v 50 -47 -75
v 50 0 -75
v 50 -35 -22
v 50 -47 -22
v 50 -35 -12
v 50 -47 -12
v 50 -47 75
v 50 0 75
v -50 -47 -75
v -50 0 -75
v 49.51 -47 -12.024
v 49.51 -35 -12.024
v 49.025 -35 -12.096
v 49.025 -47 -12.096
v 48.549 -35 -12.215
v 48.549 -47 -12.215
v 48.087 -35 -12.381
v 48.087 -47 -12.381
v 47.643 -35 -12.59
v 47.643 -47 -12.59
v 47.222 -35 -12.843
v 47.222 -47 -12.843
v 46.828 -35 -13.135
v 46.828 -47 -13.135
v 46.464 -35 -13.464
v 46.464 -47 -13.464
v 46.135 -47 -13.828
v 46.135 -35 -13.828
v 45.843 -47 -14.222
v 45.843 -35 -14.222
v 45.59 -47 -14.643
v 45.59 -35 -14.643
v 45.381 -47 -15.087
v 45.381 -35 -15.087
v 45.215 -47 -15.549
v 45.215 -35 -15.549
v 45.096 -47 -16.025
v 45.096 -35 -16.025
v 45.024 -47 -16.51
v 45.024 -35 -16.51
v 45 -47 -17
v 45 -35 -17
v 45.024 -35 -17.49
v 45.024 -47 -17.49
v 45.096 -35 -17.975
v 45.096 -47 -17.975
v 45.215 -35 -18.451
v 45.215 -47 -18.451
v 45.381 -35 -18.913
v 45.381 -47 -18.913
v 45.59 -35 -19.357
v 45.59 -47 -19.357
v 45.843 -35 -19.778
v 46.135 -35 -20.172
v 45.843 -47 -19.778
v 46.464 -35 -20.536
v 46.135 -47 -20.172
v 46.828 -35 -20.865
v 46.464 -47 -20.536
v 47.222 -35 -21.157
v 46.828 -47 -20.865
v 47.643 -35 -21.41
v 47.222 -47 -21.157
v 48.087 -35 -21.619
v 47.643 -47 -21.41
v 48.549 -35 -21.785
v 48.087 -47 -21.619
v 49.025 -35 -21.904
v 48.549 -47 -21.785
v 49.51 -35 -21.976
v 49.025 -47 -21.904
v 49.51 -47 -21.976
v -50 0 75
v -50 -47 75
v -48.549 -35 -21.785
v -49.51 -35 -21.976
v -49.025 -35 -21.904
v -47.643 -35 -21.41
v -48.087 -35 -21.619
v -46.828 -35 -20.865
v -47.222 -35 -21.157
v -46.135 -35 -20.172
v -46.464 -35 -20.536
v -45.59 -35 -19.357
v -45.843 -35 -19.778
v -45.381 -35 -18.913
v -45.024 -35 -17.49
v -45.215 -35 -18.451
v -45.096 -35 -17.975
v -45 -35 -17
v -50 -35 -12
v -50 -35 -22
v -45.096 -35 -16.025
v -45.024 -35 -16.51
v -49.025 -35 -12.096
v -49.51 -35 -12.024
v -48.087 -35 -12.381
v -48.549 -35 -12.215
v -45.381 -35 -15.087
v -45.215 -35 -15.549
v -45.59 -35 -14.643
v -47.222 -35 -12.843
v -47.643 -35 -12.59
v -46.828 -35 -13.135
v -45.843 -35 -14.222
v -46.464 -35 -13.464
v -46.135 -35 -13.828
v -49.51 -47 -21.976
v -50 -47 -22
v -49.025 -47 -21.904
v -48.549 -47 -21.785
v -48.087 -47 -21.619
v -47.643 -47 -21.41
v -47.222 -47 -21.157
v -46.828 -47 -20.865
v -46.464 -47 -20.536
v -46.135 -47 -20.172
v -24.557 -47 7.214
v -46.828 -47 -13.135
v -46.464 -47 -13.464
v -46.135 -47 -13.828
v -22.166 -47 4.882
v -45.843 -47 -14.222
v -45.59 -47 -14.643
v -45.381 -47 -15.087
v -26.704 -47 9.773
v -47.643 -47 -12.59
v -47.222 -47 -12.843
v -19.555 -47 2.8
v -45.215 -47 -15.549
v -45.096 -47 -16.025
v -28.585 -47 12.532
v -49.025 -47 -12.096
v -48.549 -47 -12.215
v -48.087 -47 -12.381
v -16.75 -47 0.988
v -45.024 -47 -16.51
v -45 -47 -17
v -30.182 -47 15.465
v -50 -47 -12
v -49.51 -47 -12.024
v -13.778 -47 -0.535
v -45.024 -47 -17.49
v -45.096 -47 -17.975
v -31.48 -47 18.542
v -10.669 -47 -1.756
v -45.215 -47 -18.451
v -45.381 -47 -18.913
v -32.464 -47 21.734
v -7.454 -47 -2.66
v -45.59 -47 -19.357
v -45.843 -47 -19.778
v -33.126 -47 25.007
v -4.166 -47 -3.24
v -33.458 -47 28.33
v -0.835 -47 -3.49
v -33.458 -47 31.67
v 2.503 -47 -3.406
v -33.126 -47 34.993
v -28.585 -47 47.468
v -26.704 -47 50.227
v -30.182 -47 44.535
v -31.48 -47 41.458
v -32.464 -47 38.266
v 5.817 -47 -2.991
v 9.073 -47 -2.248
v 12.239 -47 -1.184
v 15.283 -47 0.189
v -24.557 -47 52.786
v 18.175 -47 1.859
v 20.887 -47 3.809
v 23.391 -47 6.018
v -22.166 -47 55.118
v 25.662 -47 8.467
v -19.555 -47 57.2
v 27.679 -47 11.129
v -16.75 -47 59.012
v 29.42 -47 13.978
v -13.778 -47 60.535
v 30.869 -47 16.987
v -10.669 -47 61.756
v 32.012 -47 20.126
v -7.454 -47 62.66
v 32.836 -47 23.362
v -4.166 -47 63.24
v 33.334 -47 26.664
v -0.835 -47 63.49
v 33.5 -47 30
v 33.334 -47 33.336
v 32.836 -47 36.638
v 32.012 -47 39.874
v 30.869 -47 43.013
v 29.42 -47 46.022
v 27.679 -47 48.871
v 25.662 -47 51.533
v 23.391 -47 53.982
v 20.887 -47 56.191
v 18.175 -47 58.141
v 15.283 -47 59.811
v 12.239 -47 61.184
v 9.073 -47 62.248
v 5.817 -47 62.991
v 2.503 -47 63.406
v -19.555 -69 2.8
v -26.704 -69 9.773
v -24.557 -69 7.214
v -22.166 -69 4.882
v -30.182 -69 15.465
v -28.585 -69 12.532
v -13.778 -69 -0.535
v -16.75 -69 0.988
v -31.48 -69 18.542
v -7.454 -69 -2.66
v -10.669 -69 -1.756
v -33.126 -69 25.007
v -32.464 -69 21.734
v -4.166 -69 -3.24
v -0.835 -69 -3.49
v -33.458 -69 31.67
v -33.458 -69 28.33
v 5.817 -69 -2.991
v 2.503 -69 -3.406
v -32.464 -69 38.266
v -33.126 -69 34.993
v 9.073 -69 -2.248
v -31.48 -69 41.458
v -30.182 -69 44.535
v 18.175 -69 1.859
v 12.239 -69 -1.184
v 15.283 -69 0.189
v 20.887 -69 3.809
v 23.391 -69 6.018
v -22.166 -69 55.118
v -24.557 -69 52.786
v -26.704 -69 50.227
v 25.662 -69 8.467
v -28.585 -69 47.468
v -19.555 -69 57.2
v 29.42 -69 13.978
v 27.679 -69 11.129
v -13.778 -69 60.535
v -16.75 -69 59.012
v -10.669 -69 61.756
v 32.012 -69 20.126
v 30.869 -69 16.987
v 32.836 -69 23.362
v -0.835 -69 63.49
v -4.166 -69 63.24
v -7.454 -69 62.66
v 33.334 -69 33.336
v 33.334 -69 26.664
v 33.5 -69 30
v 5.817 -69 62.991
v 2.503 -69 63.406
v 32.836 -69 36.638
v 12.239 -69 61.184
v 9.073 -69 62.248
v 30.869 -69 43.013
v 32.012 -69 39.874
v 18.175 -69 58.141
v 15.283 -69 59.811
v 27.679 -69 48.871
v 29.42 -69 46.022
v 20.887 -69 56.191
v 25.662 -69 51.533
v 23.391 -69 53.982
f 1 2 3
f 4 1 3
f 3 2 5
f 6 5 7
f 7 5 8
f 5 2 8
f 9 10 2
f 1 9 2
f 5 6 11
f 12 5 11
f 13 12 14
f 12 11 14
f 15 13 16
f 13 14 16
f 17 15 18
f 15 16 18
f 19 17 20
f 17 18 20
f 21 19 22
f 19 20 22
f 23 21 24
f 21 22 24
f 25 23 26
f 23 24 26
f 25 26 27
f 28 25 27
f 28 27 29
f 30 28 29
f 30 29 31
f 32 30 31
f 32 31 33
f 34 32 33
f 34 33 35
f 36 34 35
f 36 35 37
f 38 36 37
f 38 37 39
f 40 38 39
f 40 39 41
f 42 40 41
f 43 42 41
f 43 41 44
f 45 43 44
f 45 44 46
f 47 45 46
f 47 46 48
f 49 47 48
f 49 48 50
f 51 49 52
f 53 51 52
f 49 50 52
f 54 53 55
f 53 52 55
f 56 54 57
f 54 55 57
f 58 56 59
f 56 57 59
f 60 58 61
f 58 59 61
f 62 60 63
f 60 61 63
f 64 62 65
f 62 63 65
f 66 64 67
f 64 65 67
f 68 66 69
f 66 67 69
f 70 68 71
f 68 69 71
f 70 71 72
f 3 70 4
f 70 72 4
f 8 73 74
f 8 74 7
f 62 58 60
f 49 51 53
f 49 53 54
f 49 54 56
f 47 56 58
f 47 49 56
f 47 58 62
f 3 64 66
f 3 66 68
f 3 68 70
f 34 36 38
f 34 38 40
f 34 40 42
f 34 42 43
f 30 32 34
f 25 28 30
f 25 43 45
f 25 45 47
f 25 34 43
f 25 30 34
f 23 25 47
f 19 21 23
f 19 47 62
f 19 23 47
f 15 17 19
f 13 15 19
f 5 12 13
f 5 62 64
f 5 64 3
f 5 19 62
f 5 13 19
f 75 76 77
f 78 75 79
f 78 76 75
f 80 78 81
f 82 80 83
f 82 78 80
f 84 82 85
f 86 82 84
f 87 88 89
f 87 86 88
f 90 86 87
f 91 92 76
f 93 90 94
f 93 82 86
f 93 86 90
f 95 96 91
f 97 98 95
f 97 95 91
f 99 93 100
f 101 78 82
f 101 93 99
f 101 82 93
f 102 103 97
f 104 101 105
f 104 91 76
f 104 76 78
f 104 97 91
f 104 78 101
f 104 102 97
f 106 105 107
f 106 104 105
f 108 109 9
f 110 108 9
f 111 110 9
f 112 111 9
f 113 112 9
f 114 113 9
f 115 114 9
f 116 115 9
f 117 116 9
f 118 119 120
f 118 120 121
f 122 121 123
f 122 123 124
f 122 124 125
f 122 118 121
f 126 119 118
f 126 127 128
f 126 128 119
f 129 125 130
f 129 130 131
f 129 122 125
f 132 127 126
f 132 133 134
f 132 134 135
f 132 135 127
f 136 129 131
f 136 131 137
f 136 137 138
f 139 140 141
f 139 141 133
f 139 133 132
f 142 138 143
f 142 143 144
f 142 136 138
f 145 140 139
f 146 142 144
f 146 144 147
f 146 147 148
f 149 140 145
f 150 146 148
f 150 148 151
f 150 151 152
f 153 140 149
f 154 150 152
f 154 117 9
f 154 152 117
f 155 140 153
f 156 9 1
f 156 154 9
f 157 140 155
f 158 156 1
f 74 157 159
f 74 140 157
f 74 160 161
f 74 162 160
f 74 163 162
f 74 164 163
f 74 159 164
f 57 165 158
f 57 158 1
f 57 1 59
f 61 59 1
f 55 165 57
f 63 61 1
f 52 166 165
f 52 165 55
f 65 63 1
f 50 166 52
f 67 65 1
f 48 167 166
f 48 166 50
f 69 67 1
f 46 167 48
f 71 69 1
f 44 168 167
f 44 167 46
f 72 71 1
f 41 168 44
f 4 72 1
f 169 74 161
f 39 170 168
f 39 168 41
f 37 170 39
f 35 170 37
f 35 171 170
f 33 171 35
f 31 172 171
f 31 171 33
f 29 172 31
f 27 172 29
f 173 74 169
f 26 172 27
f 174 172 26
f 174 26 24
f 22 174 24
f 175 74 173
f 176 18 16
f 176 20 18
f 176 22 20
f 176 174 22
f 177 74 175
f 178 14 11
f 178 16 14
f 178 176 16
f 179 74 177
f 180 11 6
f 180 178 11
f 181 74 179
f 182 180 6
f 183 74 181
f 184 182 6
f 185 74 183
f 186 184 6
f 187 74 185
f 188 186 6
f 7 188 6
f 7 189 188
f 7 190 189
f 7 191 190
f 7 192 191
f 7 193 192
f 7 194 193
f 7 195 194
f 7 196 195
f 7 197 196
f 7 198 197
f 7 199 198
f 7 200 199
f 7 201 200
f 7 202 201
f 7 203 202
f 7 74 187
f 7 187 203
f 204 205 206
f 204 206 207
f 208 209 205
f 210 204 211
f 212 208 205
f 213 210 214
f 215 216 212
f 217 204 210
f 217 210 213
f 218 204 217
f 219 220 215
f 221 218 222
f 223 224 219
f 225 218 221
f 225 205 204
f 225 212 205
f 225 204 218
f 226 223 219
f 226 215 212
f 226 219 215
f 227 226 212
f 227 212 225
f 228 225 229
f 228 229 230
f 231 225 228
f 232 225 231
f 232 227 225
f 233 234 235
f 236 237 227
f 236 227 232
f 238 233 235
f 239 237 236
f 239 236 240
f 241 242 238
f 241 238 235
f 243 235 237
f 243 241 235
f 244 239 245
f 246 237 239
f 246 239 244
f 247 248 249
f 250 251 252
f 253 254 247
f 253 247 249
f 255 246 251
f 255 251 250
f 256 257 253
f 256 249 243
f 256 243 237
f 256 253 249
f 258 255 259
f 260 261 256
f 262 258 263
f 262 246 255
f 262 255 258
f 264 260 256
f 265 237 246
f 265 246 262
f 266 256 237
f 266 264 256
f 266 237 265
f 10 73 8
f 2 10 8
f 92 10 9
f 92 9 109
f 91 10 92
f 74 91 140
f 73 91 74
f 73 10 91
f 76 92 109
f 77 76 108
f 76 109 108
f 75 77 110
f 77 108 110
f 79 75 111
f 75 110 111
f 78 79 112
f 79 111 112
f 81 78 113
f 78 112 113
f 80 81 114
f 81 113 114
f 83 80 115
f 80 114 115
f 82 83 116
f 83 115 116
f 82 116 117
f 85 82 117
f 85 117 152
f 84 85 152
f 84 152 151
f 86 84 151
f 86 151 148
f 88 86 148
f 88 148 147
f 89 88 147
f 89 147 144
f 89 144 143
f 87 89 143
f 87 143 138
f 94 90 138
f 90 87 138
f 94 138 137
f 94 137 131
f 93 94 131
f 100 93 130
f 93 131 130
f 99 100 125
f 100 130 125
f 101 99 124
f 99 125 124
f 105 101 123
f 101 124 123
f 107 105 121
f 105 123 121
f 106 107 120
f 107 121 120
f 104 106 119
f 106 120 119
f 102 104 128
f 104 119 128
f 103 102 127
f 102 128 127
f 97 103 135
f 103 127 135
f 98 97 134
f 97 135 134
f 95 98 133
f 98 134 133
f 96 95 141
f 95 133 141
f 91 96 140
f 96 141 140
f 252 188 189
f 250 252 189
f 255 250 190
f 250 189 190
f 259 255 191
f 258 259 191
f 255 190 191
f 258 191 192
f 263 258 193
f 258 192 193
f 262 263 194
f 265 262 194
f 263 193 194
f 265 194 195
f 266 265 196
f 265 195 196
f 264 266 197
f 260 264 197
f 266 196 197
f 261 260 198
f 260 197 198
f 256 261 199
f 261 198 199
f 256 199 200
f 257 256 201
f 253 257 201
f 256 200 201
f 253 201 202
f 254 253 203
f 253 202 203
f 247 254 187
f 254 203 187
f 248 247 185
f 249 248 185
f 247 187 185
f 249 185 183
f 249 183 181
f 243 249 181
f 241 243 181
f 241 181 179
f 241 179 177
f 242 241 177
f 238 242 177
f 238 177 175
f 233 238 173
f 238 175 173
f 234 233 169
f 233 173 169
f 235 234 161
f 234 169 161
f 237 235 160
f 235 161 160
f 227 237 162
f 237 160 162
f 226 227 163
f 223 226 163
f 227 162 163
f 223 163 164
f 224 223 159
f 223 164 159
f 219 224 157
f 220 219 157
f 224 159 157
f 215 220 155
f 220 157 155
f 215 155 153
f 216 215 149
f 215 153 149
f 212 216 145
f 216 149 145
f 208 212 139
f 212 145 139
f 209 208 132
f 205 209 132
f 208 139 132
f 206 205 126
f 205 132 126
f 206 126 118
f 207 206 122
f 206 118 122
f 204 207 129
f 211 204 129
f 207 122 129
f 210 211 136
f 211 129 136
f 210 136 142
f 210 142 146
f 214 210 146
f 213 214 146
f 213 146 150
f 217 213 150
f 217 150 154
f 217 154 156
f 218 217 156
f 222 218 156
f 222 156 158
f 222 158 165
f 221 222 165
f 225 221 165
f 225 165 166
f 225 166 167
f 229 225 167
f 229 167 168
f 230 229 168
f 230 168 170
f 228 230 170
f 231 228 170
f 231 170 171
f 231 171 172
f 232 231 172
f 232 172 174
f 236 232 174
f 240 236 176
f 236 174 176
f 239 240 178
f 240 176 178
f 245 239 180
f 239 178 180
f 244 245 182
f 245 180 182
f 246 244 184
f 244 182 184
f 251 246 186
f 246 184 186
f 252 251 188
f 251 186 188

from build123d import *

# Parameters (mm, degrees)
F0_W     = 100
F0_H     = 150
F1_DEPTH = 47
F2_R     = 33.5
F3_DEPTH = 22
F4_R     = 5
F5_DEPTH = 12


with BuildPart() as f1:
    # F0 (on Front) → F1 (new body)
    with BuildSketch(Plane.XZ):
        Rectangle(F0_W, F0_H)
    extrude(amount=F1_DEPTH)

    # F2 (on face) → F3 (join)
    with BuildSketch(Plane.XZ.offset(47)):
        with Locations((0, 30)):
            Circle(F2_R)
    extrude(amount=F3_DEPTH)

    # F4 (on face) → F5 (cut)
    with BuildSketch(Plane.XZ.offset(47)):
        with Locations((50, -17)):
            Circle(F4_R)
        with Locations((-50, -17)):
            Circle(F4_R)
    extrude(amount=-F5_DEPTH, mode=Mode.SUBTRACT)


solid = f1.part
